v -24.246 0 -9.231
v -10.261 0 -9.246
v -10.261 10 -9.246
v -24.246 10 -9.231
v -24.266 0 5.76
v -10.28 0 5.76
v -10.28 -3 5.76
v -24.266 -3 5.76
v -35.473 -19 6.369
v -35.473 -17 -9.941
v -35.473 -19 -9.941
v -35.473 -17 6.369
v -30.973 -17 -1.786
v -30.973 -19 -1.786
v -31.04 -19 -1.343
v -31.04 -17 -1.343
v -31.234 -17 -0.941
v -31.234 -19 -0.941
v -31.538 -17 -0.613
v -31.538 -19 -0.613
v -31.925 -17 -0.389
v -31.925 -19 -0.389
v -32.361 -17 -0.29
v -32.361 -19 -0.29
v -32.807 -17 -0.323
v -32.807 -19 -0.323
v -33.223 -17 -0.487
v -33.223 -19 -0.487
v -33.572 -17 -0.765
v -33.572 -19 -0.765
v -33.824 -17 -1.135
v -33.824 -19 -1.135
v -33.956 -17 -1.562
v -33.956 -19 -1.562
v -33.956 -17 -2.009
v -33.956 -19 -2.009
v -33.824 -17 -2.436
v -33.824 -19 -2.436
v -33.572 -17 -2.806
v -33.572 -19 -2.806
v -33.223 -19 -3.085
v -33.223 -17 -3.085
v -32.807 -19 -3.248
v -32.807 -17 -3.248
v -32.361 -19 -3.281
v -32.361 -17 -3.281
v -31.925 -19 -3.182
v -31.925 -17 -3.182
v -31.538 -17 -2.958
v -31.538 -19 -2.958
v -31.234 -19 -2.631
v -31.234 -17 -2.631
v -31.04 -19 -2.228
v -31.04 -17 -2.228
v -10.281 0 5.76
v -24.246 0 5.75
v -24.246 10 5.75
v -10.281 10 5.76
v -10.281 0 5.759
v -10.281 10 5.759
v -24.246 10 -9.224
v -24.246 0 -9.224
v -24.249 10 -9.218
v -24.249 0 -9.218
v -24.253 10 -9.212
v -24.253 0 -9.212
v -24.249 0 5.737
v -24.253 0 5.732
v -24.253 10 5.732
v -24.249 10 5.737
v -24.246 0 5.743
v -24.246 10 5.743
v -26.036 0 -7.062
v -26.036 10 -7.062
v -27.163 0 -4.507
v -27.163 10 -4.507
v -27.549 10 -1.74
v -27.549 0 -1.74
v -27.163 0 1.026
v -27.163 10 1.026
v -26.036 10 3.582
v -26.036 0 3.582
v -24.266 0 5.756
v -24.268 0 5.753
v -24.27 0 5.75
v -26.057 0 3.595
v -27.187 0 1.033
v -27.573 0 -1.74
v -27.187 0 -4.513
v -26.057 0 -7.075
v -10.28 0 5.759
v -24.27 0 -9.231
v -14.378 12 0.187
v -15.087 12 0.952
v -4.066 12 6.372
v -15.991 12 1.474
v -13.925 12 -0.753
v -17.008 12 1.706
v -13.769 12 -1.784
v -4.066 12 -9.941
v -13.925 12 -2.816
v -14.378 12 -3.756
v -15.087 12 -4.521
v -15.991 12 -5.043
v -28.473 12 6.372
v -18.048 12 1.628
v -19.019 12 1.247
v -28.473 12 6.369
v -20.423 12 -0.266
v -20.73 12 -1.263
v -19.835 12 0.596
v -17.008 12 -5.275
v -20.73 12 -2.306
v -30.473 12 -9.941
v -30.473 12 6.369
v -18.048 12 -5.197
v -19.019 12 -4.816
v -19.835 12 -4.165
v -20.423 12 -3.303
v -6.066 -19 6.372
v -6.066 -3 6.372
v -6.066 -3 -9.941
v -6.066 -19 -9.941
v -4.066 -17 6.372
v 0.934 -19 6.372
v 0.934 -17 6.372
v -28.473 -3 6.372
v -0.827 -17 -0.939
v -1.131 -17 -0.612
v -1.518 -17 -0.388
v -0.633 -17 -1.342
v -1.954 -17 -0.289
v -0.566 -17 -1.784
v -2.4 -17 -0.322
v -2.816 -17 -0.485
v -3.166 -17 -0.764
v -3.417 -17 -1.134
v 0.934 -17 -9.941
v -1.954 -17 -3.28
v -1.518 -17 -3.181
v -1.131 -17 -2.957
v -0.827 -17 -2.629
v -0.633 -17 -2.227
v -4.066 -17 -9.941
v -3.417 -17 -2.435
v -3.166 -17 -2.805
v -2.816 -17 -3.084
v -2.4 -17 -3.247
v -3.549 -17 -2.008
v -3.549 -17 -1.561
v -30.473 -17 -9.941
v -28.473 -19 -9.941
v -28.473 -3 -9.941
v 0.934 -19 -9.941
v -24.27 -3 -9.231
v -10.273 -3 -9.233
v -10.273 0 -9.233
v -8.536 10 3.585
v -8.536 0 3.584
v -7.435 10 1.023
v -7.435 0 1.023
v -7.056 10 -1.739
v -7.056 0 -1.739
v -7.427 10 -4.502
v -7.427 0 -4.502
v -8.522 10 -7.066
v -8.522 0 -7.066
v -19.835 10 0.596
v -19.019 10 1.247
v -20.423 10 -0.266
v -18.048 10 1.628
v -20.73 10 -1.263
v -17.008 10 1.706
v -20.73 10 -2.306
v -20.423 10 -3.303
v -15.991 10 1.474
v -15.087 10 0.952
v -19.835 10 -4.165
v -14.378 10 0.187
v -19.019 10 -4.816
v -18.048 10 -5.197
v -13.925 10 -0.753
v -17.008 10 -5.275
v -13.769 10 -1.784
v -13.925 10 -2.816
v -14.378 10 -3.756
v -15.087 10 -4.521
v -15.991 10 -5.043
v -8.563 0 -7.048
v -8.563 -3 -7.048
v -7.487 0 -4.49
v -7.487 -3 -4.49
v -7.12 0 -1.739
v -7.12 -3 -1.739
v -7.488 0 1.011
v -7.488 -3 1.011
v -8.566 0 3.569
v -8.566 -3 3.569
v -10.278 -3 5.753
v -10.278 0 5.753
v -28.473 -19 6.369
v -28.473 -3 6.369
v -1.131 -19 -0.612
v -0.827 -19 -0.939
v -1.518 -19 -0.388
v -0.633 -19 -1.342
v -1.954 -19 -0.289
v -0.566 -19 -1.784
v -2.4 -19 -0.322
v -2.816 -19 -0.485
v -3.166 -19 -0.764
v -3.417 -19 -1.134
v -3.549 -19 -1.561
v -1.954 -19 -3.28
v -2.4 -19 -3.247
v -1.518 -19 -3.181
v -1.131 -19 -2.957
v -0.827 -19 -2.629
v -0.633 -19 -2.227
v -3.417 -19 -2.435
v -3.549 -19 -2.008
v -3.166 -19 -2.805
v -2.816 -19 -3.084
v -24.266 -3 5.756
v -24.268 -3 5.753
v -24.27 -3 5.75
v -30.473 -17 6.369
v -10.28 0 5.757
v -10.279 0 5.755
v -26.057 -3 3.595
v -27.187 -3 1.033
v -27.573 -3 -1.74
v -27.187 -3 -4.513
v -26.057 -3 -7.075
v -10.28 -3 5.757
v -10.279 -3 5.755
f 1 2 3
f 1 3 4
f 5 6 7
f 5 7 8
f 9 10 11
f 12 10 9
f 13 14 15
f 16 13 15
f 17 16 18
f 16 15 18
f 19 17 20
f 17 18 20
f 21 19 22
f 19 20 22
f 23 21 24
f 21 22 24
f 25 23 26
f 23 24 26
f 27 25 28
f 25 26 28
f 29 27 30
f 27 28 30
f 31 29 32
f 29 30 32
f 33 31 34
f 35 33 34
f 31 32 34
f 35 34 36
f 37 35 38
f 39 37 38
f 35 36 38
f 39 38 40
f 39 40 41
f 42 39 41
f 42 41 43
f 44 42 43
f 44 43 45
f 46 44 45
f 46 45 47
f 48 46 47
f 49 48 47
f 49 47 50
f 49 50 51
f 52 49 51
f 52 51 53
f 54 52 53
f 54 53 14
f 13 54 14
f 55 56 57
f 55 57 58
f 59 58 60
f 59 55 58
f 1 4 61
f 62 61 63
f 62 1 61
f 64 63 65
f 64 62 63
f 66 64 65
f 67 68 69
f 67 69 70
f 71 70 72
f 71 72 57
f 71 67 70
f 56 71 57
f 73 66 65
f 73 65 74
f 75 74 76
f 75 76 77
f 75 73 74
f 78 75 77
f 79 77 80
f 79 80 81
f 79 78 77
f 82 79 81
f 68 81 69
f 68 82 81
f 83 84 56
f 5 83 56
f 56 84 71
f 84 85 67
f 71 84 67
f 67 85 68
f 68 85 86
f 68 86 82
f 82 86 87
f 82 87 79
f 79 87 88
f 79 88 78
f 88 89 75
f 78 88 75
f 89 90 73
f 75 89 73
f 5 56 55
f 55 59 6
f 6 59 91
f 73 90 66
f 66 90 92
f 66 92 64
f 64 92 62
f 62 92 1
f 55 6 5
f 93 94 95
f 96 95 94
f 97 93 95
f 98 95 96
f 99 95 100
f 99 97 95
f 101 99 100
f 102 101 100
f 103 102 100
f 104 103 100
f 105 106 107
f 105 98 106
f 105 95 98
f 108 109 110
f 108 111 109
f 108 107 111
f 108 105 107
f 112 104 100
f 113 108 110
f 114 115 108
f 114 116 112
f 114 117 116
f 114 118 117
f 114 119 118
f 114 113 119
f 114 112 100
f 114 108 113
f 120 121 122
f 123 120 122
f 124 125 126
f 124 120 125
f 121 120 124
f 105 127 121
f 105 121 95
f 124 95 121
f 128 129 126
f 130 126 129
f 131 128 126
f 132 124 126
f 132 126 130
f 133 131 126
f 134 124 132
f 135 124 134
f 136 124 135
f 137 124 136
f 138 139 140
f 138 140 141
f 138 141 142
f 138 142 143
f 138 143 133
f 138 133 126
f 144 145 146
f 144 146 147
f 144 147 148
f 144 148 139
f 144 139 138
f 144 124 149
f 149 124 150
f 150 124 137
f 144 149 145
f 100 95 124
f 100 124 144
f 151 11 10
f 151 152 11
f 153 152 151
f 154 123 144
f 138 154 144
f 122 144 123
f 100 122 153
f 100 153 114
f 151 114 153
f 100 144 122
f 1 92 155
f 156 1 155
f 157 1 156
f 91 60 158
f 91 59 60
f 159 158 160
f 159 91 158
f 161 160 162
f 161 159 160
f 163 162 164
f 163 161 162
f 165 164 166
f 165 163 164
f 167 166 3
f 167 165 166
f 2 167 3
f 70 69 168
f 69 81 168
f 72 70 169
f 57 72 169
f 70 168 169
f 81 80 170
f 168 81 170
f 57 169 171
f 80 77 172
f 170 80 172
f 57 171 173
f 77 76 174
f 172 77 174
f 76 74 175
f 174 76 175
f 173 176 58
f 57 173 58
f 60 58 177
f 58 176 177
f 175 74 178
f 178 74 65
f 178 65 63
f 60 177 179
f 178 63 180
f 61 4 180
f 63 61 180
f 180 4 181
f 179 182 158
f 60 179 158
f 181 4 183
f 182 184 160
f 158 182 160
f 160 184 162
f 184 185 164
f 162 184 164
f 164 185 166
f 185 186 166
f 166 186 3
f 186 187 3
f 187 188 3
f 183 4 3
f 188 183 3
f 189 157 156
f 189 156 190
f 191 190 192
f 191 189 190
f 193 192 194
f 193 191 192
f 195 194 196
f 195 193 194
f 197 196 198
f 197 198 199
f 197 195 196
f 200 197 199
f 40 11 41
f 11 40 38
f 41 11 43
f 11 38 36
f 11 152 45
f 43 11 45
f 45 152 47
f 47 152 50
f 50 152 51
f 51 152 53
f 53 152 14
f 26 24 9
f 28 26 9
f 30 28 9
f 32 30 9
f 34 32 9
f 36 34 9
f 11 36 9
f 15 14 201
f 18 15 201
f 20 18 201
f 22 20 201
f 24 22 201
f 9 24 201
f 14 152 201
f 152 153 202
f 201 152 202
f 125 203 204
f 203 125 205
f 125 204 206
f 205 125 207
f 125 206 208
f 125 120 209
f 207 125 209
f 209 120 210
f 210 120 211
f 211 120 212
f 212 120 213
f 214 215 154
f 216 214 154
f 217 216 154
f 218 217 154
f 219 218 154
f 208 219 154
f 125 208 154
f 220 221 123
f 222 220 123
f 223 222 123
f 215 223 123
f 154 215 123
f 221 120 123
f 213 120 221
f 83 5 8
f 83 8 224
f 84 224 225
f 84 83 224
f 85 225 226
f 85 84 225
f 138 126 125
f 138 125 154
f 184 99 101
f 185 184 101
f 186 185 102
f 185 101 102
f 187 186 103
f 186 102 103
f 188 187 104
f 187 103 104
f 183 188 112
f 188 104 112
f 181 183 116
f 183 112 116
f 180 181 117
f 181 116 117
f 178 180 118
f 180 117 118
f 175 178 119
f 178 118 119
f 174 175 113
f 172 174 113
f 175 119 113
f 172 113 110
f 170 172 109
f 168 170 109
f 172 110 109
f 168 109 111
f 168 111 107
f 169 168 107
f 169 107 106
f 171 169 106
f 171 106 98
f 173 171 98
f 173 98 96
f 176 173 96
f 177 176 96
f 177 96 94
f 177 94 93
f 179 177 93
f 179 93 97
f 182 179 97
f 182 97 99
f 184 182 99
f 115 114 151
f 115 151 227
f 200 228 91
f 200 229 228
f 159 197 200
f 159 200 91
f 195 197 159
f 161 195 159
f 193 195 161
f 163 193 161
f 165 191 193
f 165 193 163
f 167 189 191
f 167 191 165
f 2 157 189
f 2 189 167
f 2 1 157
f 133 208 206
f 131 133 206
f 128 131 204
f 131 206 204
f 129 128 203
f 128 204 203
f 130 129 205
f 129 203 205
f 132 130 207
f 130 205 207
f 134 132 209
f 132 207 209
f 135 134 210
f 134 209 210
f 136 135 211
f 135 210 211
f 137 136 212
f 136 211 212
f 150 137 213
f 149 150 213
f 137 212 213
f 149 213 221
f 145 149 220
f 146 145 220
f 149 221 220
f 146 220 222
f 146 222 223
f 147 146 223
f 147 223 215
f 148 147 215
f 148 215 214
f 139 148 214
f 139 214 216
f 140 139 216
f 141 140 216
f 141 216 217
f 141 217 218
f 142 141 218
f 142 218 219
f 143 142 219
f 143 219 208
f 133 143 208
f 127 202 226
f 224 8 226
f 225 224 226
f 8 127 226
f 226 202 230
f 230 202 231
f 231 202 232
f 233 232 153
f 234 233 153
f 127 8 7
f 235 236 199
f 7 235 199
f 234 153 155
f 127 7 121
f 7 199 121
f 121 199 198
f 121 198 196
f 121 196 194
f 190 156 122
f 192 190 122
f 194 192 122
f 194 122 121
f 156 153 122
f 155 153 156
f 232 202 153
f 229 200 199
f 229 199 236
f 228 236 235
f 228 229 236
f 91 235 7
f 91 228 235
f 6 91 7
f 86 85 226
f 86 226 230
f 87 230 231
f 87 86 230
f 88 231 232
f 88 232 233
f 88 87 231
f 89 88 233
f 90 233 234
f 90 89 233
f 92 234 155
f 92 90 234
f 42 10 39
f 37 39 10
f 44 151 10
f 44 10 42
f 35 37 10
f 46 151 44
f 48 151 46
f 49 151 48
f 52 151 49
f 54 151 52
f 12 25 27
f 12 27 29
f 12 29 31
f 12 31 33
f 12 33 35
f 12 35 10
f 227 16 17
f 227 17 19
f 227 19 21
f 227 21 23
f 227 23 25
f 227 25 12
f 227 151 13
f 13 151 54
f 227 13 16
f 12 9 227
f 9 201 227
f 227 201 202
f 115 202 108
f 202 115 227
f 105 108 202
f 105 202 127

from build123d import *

# Parameters (mm, degrees)
Y_KSEKLIK_EKSTR_ZYON1_DEPTH = 12
Y_KSEKLIK_EKSTR_ZYON3_DEPTH = 15
KES_EKSTR_ZYON2_DEPTH       = 10
IZIM7_R                     = 3.5
KES_EKSTR_ZYON3_DEPTH       = 10
IZIM9_W                     = 16.31
IZIM9_H                     = 31
Y_KSEKLIK_EKSTR_ZYON4_DEPTH = 2
IZIM11_W                    = 16.312144578
IZIM11_H                    = 31
Y_KSEKLIK_EKSTR_ZYON5_DEPTH = 2
IZIM12_W                    = 16.312144578
IZIM12_H                    = 2
Y_KSEKLIK_EKSTR_ZYON6_DEPTH = 5
IZIM13_W                    = 16.31
IZIM13_H                    = 2
Y_KSEKLIK_EKSTR_ZYON7_DEPTH = 5
IZIM16_R                    = 1.5
KES_EKSTR_ZYON4_DEPTH       = 5


with BuildPart() as part:
    # Çizim1 → Yükseklik-Ekstrüzyon1 (new body)
    with BuildSketch(Plane(origin=(0, 0, 0), x_dir=(1, 0, 0), z_dir=(0, 1, 0))):
        with BuildLine():
            Line((-10.273080285, 9.233441174), (-24.270017386, 9.23050626))
            ThreePointArc((-24.270017386, 9.23050626), (-27.573247243, 1.740187513), (-24.270017386, -5.750131234))
            ThreePointArc((-24.270017386, -5.750131234), (-24.266862702, -5.754522055), (-24.265747955, -5.759812487))
            Line((-24.265747955, -5.759812487), (-10.280448773, -5.759812487))
            ThreePointArc((-10.280448773, -5.759812487), (-10.279708775, -5.756150024), (-10.277604879, -5.753062168))
            ThreePointArc((-10.277604879, -5.753062168), (-7.119784217, 1.739236804), (-10.273080285, 9.233441174))
        make_face()
    extrude(amount=Y_KSEKLIK_EKSTR_ZYON1_DEPTH)

    # Çizim2 → Yükseklik-Ekstrüzyon3 (add)
    with BuildSketch(Plane(origin=(0, 12, 0), x_dir=(1, 0, 0), z_dir=(0, 1, 0))):
        Polygon((-28.472879545, -6.371596623), (-24.972879545, -6.371596623), (-6.065973504, -6.371596623), (-6.065973504, 9.940547955), (-9.565973504, 9.940547955), (-28.472879545, 9.940547955), align=None)
        with BuildLine():
            ThreePointArc((-10.277604879, -5.753062168), (-10.279708775, -5.756150024), (-10.280448773, -5.759812487))
            Line((-10.280448773, -5.759812487), (-24.265747955, -5.759812487))
            ThreePointArc((-24.265747955, -5.759812487), (-24.266862702, -5.754522055), (-24.270017386, -5.750131234))
            ThreePointArc((-24.270017386, -5.750131234), (-27.573247243, 1.740187513), (-24.270017386, 9.23050626))
            Line((-24.270017386, 9.23050626), (-10.273080285, 9.233441174))
            ThreePointArc((-10.273080285, 9.233441174), (-7.119784217, 1.739236804), (-10.277604879, -5.753062168))
        make_face(mode=Mode.SUBTRACT)
    extrude(amount=-Y_KSEKLIK_EKSTR_ZYON3_DEPTH)

    # Çizim5 → Kes-Ekstrüzyon2 (cut)
    with BuildSketch(Plane(origin=(0, 0, 0), x_dir=(1, 0, 0), z_dir=(0, 1, 0))):
        with BuildLine():
            ThreePointArc((-24.253497742, -5.732043117), (-24.24760022, -5.74025453), (-24.24552089, -5.750148186))
            Line((-24.24552089, -5.750148186), (-10.281129786, -5.759812016))
            ThreePointArc((-10.281129786, -5.759812016), (-10.28107446, -5.75954361), (-10.280917812, -5.759318746))
            ThreePointArc((-10.280917812, -5.759318746), (-7.055942633, 1.738860839), (-10.261152425, 9.245510703))
            ThreePointArc((-10.261152425, 9.245510703), (-10.261308072, 9.245735025), (-10.261363099, 9.246002453))
            Line((-10.261363099, 9.246002453), (-24.245520899, 9.230533357))
            ThreePointArc((-24.245520899, 9.230533357), (-24.247598176, 9.220634198), (-24.253497742, 9.212418143))
            ThreePointArc((-24.253497742, 9.212418143), (-27.548750741, 1.740187513), (-24.253497742, -5.732043117))
        make_face()
    extrude(amount=KES_EKSTR_ZYON2_DEPTH, mode=Mode.SUBTRACT)

    # Çizim7 → Kes-Ekstrüzyon3 (cut)
    with BuildSketch(Plane(origin=(0, 12, 0), x_dir=(1, 0, 0), z_dir=(0, 1, 0))):
        with Locations((-17.269426524, 1.784475666)):
            Circle(IZIM7_R)
    extrude(amount=-KES_EKSTR_ZYON3_DEPTH, mode=Mode.SUBTRACT)

    # Çizim9 → Yükseklik-Ekstrüzyon4 (add)
    with BuildSketch(Plane.ZY.offset(28.472879545)):
        with Locations((-1.785547955, -3.5)):
            Rectangle(IZIM9_W, IZIM9_H)
    extrude(amount=Y_KSEKLIK_EKSTR_ZYON4_DEPTH)

    # Çizim11 → Yükseklik-Ekstrüzyon5 (add)
    with BuildSketch(Plane(origin=(-6.065973504, 0, 0), x_dir=(0, 0, -1), z_dir=(1, 0, 0))):
        with Locations((1.784475666, -3.5)):
            Rectangle(IZIM11_W, IZIM11_H)
    extrude(amount=Y_KSEKLIK_EKSTR_ZYON5_DEPTH)

    # Çizim12 → Yükseklik-Ekstrüzyon6 (add)
    with BuildSketch(Plane(origin=(-4.065973504, 0, 0), x_dir=(0, 0, -1), z_dir=(1, 0, 0))):
        with Locations((1.784475666, -18)):
            Rectangle(IZIM12_W, IZIM12_H)
    extrude(amount=Y_KSEKLIK_EKSTR_ZYON6_DEPTH)

    # Çizim13 → Yükseklik-Ekstrüzyon7 (add)
    with BuildSketch(Plane.ZY.offset(30.472879545)):
        with Locations((-1.785547955, -18)):
            Rectangle(IZIM13_W, IZIM13_H)
    extrude(amount=Y_KSEKLIK_EKSTR_ZYON7_DEPTH)

    # Çizim16 → Kes-Ekstrüzyon4 (cut)
    with BuildSketch(Plane.XZ.offset(19)):
        with Locations((-32.472879545, -1.785547955)):
            Circle(IZIM16_R)
        with Locations((-2.065973504, -1.784475666)):
            Circle(IZIM16_R)
    extrude(amount=-KES_EKSTR_ZYON4_DEPTH, mode=Mode.SUBTRACT)


solid = part.part
